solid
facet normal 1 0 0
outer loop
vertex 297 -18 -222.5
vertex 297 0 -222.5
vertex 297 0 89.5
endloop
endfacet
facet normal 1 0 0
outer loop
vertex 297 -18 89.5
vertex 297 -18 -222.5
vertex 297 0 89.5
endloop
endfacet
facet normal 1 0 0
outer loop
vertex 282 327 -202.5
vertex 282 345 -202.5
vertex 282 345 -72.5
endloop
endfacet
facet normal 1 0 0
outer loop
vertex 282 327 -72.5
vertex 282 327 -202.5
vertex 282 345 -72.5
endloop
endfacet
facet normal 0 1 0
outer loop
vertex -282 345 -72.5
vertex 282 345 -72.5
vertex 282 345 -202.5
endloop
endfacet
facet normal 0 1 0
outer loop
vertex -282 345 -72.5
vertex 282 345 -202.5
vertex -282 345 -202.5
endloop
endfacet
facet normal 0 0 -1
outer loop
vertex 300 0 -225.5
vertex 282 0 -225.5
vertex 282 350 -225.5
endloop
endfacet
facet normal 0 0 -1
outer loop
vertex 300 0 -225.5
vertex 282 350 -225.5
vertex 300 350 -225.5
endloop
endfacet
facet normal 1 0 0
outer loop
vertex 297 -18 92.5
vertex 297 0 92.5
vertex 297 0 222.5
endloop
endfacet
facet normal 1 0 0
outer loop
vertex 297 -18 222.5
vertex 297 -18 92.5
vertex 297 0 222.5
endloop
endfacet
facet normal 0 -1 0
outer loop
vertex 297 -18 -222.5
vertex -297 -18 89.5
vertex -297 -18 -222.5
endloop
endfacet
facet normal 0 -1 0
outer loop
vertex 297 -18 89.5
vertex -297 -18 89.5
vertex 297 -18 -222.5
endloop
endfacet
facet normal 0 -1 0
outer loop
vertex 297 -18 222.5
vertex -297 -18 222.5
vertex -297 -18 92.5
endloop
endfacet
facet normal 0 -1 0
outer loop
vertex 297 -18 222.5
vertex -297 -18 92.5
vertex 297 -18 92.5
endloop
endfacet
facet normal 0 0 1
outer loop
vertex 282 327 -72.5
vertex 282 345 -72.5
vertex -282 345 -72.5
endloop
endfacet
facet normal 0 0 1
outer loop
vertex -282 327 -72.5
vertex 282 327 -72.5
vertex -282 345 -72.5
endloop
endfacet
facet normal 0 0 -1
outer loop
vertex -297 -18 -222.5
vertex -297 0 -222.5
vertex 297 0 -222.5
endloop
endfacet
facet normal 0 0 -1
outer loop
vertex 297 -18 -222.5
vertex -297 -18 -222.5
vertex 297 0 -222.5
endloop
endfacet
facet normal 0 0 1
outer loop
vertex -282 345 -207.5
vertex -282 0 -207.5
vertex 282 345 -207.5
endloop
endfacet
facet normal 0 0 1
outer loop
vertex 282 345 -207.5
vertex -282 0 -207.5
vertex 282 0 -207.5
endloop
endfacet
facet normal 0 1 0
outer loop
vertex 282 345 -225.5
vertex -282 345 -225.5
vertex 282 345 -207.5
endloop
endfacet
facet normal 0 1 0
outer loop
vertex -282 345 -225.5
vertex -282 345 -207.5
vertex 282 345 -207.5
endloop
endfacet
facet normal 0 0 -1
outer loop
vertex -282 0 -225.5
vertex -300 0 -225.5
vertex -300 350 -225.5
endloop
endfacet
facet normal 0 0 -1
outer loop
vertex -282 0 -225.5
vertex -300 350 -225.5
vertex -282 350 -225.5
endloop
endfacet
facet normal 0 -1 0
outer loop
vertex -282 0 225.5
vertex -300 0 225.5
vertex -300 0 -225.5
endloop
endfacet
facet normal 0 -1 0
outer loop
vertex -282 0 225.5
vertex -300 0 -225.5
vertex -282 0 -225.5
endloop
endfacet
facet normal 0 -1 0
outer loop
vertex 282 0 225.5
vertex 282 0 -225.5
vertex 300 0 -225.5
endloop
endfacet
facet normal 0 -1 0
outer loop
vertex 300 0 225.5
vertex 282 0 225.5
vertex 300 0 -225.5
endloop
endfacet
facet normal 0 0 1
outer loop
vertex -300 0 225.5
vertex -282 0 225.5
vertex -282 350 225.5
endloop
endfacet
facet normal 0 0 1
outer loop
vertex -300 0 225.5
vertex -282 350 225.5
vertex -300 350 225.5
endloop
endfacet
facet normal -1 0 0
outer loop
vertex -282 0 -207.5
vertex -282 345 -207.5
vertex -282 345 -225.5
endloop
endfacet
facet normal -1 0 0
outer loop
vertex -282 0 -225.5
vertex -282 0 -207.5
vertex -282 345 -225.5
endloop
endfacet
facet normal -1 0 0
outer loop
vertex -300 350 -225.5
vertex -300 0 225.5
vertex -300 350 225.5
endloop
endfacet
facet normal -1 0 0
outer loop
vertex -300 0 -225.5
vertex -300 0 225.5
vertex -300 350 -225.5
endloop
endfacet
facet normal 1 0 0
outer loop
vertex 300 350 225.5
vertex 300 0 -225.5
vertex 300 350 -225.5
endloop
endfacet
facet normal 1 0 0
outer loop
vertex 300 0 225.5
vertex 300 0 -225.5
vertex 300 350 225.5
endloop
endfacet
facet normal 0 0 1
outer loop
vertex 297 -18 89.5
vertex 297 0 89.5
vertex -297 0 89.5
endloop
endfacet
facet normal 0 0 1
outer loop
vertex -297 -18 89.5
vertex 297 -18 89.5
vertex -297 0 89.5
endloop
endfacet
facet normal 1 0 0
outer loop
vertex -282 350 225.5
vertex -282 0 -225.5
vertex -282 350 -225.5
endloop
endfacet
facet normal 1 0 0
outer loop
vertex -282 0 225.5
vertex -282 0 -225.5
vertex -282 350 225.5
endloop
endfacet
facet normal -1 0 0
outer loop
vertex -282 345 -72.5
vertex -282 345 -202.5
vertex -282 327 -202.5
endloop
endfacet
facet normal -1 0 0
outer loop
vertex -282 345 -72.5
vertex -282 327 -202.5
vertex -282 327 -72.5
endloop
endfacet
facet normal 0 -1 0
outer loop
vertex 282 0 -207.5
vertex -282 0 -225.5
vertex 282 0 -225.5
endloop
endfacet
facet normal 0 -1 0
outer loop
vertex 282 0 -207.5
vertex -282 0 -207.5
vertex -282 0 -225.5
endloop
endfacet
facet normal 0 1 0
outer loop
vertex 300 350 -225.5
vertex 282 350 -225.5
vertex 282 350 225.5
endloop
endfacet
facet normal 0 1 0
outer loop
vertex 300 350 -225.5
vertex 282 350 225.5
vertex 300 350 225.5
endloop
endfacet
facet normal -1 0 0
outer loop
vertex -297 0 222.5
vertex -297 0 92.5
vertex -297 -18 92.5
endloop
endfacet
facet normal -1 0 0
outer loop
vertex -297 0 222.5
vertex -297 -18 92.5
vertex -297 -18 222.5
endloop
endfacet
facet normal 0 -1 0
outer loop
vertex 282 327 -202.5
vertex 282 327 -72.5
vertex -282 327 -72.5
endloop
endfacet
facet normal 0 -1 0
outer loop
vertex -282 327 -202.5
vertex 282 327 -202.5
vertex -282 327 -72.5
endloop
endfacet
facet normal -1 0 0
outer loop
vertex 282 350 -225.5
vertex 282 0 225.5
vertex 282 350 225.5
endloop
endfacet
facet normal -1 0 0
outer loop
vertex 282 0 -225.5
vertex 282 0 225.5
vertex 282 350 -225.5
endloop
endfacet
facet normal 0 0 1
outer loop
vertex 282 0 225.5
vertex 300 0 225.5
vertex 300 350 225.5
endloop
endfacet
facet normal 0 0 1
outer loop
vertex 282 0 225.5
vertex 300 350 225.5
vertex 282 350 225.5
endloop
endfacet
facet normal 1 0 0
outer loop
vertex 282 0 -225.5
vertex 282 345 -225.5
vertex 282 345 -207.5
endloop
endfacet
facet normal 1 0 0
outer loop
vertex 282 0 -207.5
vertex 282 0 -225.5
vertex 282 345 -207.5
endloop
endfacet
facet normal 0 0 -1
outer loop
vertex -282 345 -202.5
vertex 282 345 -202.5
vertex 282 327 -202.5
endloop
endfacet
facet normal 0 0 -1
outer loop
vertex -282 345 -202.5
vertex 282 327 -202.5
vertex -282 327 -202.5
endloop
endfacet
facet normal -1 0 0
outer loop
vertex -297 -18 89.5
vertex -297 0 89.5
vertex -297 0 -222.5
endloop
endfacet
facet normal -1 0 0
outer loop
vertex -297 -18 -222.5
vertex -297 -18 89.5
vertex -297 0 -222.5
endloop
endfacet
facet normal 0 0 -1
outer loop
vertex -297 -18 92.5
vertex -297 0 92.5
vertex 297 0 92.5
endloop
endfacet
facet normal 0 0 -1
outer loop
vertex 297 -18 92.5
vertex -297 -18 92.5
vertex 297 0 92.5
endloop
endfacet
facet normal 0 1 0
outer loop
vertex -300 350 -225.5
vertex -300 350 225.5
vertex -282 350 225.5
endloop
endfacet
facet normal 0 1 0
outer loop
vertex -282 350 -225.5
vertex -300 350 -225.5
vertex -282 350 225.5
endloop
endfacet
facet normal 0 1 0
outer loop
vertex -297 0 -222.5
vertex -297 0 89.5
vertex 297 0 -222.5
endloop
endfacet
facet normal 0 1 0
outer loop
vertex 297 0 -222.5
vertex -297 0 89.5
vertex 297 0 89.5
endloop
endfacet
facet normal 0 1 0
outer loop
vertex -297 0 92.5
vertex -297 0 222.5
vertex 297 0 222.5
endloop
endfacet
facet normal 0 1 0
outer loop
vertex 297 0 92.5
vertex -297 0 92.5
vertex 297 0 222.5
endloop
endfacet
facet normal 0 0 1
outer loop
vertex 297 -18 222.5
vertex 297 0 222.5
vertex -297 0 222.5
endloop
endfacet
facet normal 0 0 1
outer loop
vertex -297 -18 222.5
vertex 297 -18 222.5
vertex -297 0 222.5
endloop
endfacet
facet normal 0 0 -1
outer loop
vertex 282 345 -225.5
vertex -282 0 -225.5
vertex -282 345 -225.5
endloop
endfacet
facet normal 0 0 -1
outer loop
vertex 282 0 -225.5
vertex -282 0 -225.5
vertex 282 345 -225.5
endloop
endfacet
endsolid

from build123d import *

# Parameters (mm, degrees)
F0_W     = 15
F0_H     = 130
F1_DEPTH = 350
F0_W_2   = 564
F0_H_2   = 3
F0_H_3   = 15
F2_DEPTH = 345
F3_W     = 564
F3_H     = 130
F4_DEPTH = 18
F0_H_4   = 162
F0_H_5   = 5
F5_DEPTH = 18


with BuildPart() as f1:
    # F0 (on Front) → F1 (new body)
    with BuildSketch(Plane.XZ):
        with Locations((-289.5, 157.5)):
            Rectangle(F0_W, F0_H)
        Polygon((-297, -222.5), (-282, -222.5), (-282, -207.5), (-282, -202.5), (-282, -72.5), (-282, 89.5), (-297, 89.5), align=None)
        Polygon((-282, 222.5), (-282, 225.5), (-300, 225.5), (-300, -225.5), (-282, -225.5), (-282, -222.5), (-297, -222.5), (-297, 89.5), (-282, 89.5), (-282, 92.5), (-297, 92.5), (-297, 222.5), align=None)
    extrude(amount=-F1_DEPTH)


with BuildPart() as f1b:
    # F0 (on Front) → F1, piece 2 (new body)
    with BuildSketch(Plane.XZ):
        Polygon((300, -225.5), (300, 225.5), (282, 225.5), (282, 222.5), (297, 222.5), (297, 92.5), (282, 92.5), (282, 89.5), (297, 89.5), (297, -222.5), (282, -222.5), (282, -225.5), align=None)
        with Locations((289.5, 157.5)):
            Rectangle(F0_W, F0_H)
        Polygon((282, -207.5), (282, -222.5), (297, -222.5), (297, 89.5), (282, 89.5), (282, -72.5), (282, -202.5), align=None)
    extrude(amount=-F1_DEPTH)


with BuildPart() as f2:
    # F0 (on Front) → F2 (new body)
    with BuildSketch(Plane.XZ):
        with Locations((0, -224)):
            Rectangle(F0_W_2, F0_H_2)
        with Locations((0, -215)):
            Rectangle(F0_W_2, F0_H_3)
    extrude(amount=-F2_DEPTH)


with BuildPart() as f4:
    # F3 (on face) → F4 (new body)
    with BuildSketch(Plane(origin=(0, 345, 0), x_dir=(-1, 0, 0), z_dir=(0, 1, 0))):
        with Locations((0, -137.5)):
            Rectangle(F3_W, F3_H)
    extrude(amount=-F4_DEPTH)


with BuildPart() as f5:
    # F0 (on Front) → F5 (new body)
    with BuildSketch(Plane.XZ):
        Polygon((-297, -222.5), (-282, -222.5), (-282, -207.5), (-282, -202.5), (-282, -72.5), (-282, 89.5), (-297, 89.5), align=None)
        with Locations((0, 8.5)):
            Rectangle(F0_W_2, F0_H_4)
        Polygon((282, -207.5), (282, -222.5), (297, -222.5), (297, 89.5), (282, 89.5), (282, -72.5), (282, -202.5), align=None)
        with Locations((0, -137.5)):
            Rectangle(F0_W_2, F0_H)
        with Locations((0, -205)):
            Rectangle(F0_W_2, F0_H_5)
        with Locations((0, -215)):
            Rectangle(F0_W_2, F0_H_3)
    extrude(amount=F5_DEPTH)


with BuildPart() as f5b:
    # F0 (on Front) → F5, piece 2 (new body)
    with BuildSketch(Plane.XZ):
        with Locations((0, 157.5)):
            Rectangle(F0_W_2, F0_H)
        with Locations((-289.5, 157.5)):
            Rectangle(F0_W, F0_H)
        with Locations((289.5, 157.5)):
            Rectangle(F0_W, F0_H)
    extrude(amount=F5_DEPTH)


solid = Compound([f1.part, f1b.part, f2.part, f4.part, f5.part, f5b.part])
